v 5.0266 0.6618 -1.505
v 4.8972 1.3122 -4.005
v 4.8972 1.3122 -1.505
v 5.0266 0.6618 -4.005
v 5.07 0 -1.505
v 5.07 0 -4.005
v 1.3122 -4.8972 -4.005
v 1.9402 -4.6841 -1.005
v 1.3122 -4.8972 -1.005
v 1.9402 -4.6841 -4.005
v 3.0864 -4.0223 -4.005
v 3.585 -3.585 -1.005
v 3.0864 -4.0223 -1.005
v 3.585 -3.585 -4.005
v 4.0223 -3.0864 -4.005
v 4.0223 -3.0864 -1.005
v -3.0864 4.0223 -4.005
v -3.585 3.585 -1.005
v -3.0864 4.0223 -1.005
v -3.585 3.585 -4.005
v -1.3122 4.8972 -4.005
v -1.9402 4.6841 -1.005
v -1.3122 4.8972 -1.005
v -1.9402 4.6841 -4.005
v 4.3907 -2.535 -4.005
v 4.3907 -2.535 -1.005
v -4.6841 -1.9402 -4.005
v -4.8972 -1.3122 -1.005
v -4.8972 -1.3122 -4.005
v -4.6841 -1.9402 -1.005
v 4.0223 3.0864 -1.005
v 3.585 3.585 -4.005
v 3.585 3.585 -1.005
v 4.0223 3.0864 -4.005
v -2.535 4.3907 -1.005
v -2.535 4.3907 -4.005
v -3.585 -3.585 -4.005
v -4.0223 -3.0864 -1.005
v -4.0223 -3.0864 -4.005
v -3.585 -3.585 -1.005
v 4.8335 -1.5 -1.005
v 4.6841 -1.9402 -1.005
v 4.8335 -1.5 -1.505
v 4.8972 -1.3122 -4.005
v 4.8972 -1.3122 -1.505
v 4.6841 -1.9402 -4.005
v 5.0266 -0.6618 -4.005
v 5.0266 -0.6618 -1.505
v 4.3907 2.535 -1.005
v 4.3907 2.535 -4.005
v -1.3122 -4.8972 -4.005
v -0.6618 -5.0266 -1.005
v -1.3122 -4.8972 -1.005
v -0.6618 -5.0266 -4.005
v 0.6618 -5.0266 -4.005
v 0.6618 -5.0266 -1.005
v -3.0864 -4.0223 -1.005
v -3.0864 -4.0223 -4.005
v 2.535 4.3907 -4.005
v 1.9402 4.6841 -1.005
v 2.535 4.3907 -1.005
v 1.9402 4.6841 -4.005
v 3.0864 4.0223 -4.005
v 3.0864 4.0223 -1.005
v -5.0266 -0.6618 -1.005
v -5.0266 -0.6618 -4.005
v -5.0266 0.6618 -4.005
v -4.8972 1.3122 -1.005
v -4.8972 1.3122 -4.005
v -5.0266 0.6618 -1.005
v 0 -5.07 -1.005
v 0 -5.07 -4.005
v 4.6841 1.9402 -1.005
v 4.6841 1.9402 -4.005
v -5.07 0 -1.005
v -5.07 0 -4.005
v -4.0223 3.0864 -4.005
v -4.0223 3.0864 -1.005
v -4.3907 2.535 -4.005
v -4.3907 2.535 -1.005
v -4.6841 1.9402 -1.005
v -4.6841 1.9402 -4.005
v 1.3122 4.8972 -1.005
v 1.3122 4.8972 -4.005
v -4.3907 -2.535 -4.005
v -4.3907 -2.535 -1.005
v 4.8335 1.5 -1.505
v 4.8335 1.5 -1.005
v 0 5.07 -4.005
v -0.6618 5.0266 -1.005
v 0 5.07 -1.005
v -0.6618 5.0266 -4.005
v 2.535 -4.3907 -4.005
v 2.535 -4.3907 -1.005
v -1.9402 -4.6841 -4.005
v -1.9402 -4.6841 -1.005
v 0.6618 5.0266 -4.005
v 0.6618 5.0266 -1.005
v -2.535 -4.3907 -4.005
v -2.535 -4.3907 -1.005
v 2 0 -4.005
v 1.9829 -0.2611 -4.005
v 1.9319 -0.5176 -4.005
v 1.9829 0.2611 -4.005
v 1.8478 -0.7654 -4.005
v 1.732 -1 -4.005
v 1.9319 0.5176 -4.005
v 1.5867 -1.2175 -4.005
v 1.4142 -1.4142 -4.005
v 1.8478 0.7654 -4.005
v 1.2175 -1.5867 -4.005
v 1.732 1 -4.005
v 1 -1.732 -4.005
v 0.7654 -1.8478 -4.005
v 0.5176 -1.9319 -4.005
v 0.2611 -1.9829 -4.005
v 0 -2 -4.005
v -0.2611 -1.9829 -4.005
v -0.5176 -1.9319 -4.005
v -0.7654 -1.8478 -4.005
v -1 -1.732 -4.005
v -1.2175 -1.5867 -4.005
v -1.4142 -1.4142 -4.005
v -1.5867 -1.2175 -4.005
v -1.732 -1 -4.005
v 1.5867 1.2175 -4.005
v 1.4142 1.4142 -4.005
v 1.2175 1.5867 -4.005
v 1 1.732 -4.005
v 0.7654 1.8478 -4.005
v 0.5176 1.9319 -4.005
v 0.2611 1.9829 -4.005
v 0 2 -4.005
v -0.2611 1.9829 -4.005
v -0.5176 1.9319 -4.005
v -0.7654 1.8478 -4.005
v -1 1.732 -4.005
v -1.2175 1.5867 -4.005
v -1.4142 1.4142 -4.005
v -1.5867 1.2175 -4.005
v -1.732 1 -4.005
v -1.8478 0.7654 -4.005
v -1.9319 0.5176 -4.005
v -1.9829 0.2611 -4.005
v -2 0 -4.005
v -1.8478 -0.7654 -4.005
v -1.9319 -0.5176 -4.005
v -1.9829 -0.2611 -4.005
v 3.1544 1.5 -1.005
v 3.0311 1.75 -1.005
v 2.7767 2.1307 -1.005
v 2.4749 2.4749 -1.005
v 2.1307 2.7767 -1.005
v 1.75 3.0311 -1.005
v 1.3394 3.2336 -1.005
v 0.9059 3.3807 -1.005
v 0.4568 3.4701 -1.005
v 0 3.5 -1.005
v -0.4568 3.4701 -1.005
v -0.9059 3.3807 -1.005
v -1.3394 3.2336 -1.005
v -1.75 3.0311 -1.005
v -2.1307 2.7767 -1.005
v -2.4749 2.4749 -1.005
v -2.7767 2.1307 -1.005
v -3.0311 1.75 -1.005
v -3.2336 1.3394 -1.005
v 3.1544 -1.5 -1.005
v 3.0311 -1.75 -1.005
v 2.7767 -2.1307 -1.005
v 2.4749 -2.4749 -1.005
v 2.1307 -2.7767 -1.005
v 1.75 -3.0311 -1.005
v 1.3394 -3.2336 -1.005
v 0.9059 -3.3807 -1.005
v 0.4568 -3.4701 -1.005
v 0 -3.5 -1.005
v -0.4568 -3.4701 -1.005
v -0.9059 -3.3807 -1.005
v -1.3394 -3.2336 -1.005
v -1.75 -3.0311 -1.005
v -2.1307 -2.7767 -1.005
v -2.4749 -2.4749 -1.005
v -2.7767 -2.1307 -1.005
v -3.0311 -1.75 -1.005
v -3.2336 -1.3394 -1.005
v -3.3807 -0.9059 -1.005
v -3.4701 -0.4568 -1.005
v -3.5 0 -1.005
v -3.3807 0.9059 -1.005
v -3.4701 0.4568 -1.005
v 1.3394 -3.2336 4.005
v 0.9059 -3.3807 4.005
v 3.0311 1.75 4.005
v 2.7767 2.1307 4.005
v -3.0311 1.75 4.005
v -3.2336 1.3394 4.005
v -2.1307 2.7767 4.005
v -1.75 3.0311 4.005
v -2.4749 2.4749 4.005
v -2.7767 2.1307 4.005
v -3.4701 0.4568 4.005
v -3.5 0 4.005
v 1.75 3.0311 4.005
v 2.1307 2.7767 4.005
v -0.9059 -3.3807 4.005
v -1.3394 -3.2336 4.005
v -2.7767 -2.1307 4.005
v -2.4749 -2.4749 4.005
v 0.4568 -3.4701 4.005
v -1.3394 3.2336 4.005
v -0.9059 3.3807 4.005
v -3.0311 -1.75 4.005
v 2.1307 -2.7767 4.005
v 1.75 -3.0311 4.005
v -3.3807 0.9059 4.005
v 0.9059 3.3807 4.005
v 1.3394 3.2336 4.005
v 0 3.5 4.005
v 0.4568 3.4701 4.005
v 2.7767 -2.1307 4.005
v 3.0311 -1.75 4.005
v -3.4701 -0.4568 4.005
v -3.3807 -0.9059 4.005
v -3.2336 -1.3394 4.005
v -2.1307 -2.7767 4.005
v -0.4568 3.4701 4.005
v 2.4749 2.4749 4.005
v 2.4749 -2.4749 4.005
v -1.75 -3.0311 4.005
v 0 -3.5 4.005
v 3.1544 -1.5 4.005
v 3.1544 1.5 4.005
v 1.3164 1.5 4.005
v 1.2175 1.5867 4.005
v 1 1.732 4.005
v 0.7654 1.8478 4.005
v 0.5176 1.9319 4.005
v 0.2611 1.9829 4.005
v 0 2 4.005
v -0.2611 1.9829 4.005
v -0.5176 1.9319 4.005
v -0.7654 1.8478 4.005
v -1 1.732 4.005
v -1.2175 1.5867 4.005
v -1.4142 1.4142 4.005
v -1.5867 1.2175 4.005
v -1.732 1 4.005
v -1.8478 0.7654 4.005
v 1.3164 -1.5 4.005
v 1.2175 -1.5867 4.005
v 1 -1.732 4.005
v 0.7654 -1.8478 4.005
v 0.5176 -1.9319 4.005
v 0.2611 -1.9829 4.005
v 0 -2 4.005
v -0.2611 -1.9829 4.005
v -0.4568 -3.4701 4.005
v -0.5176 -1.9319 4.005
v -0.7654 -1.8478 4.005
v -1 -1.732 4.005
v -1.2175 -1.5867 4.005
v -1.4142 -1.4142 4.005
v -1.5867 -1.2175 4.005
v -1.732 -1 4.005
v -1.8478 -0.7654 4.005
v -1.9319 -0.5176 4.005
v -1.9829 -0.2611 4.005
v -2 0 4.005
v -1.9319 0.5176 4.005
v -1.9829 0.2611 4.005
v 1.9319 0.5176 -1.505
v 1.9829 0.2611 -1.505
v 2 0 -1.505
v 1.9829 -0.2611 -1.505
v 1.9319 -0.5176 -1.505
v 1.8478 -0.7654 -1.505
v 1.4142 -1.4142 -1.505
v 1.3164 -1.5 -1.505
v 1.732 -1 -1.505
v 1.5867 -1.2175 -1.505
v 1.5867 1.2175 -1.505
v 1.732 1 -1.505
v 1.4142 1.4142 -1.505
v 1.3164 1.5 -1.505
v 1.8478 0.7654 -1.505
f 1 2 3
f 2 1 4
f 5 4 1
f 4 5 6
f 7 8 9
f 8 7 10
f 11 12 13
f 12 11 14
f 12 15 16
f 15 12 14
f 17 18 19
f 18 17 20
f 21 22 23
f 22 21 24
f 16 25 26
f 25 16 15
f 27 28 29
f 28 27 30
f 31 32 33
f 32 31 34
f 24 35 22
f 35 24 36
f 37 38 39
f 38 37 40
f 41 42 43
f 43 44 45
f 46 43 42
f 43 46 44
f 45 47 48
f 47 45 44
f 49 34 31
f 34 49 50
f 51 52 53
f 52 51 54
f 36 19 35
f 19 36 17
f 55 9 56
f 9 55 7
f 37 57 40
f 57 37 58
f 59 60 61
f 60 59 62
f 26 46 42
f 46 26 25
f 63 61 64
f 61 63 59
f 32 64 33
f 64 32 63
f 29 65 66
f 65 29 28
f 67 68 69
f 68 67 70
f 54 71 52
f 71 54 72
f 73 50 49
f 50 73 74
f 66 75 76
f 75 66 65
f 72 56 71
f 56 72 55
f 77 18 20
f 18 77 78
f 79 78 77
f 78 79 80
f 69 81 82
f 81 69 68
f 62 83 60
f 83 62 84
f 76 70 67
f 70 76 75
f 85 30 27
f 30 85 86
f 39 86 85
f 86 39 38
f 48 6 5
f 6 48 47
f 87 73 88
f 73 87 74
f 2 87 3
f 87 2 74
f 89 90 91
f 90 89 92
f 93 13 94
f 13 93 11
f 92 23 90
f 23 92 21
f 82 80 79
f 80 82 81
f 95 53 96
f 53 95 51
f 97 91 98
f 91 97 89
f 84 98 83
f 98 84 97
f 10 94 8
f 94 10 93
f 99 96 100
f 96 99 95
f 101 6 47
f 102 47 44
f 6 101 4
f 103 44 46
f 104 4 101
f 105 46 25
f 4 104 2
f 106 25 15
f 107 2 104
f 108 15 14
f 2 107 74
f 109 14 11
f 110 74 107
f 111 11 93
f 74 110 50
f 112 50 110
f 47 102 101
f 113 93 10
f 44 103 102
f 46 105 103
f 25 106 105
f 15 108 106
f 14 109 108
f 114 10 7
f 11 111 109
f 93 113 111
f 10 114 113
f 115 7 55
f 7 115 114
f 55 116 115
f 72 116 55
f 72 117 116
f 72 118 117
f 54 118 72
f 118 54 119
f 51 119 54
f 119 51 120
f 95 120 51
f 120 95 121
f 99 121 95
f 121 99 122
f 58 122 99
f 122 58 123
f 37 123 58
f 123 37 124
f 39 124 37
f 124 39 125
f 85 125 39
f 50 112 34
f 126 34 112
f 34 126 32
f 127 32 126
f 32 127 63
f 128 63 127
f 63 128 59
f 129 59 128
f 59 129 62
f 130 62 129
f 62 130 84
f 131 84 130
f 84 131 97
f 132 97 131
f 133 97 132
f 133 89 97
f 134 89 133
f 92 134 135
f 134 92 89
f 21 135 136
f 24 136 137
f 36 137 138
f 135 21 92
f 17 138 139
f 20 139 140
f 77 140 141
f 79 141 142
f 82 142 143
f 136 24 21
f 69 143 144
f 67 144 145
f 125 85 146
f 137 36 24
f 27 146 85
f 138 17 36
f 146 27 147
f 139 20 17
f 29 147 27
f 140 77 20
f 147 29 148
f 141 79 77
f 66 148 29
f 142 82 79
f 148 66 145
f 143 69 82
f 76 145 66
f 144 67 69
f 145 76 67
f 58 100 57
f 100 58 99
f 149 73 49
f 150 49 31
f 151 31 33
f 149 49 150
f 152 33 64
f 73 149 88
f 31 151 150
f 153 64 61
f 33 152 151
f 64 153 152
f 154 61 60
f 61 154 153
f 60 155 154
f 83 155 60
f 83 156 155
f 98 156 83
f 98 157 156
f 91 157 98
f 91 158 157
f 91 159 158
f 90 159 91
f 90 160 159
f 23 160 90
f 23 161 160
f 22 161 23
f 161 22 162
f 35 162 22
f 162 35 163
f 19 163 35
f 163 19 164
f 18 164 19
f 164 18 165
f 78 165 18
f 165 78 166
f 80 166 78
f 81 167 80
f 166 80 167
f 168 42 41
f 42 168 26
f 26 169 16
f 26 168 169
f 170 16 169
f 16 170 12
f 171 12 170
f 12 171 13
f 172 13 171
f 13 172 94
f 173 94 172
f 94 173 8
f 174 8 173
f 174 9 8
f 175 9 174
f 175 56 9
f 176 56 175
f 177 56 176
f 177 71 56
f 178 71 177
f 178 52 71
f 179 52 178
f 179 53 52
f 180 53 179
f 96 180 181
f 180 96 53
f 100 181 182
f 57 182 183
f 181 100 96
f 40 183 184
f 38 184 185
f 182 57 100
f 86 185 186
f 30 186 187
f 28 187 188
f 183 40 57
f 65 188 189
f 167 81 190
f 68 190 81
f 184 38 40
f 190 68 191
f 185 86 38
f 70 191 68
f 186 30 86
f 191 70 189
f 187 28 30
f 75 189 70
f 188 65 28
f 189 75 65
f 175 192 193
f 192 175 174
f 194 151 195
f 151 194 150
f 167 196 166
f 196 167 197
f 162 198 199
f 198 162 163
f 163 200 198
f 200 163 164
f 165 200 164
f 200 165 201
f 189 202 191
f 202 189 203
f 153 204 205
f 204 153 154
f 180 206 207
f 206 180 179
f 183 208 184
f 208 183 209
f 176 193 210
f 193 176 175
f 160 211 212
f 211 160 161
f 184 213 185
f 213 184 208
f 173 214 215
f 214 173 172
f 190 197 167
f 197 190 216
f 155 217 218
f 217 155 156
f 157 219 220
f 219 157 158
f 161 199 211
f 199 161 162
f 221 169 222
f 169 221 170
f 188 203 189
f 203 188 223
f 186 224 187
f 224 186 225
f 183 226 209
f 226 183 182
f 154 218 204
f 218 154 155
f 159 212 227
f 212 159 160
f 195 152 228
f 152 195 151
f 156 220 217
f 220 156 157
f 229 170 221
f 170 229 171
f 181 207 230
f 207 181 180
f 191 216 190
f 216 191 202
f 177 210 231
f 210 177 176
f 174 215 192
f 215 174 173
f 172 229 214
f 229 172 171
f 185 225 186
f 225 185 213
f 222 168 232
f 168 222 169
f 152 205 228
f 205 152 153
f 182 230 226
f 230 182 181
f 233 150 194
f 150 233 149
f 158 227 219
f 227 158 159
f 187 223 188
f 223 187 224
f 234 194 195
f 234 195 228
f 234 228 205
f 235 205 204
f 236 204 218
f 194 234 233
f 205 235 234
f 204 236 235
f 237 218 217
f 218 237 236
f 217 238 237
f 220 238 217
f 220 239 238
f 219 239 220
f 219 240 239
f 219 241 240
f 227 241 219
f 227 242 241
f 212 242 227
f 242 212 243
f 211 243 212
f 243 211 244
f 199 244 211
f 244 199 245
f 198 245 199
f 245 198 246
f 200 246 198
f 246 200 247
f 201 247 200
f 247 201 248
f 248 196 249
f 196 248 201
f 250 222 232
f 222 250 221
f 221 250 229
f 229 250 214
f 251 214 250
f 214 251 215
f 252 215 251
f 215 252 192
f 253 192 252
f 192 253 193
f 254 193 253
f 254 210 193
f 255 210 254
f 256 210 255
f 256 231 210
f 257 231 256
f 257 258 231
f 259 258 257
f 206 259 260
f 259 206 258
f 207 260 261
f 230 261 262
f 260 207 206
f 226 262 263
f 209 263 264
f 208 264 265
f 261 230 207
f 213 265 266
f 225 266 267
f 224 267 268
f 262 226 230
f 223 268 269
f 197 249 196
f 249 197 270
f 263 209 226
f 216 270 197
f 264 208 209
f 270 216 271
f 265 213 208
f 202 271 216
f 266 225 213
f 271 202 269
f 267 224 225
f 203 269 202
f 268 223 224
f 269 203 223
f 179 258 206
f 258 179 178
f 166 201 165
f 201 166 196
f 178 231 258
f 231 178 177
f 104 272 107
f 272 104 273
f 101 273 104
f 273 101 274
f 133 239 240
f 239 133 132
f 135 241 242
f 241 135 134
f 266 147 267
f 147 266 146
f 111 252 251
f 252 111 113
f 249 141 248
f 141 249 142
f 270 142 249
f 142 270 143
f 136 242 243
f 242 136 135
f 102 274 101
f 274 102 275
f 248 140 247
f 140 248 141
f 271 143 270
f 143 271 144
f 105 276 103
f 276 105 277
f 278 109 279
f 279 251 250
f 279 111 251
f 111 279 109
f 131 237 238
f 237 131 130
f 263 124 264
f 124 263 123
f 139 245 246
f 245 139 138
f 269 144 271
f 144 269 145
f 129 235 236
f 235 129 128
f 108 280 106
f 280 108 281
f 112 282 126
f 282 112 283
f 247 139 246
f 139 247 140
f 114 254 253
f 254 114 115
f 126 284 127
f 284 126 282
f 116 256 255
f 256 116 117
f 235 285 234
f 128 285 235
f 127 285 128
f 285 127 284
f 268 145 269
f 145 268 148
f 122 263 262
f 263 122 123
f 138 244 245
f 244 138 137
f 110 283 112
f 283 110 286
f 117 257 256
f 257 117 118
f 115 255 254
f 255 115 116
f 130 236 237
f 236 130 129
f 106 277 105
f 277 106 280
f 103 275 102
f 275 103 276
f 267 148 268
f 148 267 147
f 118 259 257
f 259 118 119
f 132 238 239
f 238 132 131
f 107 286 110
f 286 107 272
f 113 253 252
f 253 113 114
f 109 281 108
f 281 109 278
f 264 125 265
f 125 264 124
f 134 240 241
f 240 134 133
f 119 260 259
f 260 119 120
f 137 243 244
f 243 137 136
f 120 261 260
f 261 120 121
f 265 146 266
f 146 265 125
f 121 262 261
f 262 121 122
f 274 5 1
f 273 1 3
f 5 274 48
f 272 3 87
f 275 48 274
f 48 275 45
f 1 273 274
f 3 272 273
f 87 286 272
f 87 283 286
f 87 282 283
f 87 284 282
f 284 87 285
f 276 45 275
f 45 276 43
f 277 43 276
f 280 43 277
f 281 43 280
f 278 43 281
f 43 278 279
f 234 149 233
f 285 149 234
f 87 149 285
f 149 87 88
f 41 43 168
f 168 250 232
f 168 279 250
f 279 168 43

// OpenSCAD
// Stepped bushing/spacer with through cylindrical bore and C-shaped side opening on upper boss
// Bounding box target: ~10.14 x 10.16 x 8.01 mm

// Parameters
bbox_x = 10.14; //[5.07:20.28:0.01]
bbox_y = 10.16; //[5.08:20.32:0.01]
bbox_z = 8.01;  //[4.0:16.02:0.01]

flange_d = 10.14; //[5.07:20.28:0.01]
flange_h = 3.0;   //[1.5:6.0:0.01]

boss_d = 7.0;     //[3.5:14.0:0.01]
boss_h = 5.01;    //[2.5:10.02:0.01]

bore_d = 4.0;     //[2.0:8.0:0.01]

// Side opening (flat) that opens the bore to exterior on the upper boss
cutout_w = 3.0;       //[1.0:6.0:0.01]   // width in Y
cutout_depth = 4.0;   //[1.0:8.0:0.01]   // how far the flat cuts into boss from OD toward center
cutout_z0 = 3.0;      //[0.0:8.0:0.01]   // start height from bottom of part
cutout_h = 5.01;      //[1.0:10.02:0.01]

overlap = 0.5;        //[0.2:2.0:0.1]

// Smoothness (kept moderate for fast rendering)
$fn = 48;

// Helpers
z_bottom = -bbox_z/2;

module base_flange() {
  translate([0,0, z_bottom + flange_h/2])
    cylinder(d=flange_d, h=flange_h, center=true);
}

module upper_boss() {
  translate([0,0, z_bottom + flange_h + boss_h/2])
    cylinder(d=boss_d, h=boss_h, center=true);
}

module through_bore() {
  cylinder(d=bore_d, h=bbox_z + 2*overlap, center=true);
}

module upper_c_opening() {
  // Flat cut on upper boss that intersects the bore, creating a C-shaped opening.
  boss_r = boss_d/2;
  x_inner = boss_r - cutout_depth;

  // Make cutter large enough to guarantee full cut without excessive size.
  cutter_len_x = boss_r + cutout_depth + 2*overlap;
  cutter_x = x_inner + cutter_len_x/2;

  translate([cutter_x, 0, z_bottom + cutout_z0 + cutout_h/2])
    cube([cutter_len_x, cutout_w, cutout_h + 2*overlap], center=true);
}

difference() {
  union() {
    base_flange();
    upper_boss();
  }
  through_bore();
  upper_c_opening();
}
